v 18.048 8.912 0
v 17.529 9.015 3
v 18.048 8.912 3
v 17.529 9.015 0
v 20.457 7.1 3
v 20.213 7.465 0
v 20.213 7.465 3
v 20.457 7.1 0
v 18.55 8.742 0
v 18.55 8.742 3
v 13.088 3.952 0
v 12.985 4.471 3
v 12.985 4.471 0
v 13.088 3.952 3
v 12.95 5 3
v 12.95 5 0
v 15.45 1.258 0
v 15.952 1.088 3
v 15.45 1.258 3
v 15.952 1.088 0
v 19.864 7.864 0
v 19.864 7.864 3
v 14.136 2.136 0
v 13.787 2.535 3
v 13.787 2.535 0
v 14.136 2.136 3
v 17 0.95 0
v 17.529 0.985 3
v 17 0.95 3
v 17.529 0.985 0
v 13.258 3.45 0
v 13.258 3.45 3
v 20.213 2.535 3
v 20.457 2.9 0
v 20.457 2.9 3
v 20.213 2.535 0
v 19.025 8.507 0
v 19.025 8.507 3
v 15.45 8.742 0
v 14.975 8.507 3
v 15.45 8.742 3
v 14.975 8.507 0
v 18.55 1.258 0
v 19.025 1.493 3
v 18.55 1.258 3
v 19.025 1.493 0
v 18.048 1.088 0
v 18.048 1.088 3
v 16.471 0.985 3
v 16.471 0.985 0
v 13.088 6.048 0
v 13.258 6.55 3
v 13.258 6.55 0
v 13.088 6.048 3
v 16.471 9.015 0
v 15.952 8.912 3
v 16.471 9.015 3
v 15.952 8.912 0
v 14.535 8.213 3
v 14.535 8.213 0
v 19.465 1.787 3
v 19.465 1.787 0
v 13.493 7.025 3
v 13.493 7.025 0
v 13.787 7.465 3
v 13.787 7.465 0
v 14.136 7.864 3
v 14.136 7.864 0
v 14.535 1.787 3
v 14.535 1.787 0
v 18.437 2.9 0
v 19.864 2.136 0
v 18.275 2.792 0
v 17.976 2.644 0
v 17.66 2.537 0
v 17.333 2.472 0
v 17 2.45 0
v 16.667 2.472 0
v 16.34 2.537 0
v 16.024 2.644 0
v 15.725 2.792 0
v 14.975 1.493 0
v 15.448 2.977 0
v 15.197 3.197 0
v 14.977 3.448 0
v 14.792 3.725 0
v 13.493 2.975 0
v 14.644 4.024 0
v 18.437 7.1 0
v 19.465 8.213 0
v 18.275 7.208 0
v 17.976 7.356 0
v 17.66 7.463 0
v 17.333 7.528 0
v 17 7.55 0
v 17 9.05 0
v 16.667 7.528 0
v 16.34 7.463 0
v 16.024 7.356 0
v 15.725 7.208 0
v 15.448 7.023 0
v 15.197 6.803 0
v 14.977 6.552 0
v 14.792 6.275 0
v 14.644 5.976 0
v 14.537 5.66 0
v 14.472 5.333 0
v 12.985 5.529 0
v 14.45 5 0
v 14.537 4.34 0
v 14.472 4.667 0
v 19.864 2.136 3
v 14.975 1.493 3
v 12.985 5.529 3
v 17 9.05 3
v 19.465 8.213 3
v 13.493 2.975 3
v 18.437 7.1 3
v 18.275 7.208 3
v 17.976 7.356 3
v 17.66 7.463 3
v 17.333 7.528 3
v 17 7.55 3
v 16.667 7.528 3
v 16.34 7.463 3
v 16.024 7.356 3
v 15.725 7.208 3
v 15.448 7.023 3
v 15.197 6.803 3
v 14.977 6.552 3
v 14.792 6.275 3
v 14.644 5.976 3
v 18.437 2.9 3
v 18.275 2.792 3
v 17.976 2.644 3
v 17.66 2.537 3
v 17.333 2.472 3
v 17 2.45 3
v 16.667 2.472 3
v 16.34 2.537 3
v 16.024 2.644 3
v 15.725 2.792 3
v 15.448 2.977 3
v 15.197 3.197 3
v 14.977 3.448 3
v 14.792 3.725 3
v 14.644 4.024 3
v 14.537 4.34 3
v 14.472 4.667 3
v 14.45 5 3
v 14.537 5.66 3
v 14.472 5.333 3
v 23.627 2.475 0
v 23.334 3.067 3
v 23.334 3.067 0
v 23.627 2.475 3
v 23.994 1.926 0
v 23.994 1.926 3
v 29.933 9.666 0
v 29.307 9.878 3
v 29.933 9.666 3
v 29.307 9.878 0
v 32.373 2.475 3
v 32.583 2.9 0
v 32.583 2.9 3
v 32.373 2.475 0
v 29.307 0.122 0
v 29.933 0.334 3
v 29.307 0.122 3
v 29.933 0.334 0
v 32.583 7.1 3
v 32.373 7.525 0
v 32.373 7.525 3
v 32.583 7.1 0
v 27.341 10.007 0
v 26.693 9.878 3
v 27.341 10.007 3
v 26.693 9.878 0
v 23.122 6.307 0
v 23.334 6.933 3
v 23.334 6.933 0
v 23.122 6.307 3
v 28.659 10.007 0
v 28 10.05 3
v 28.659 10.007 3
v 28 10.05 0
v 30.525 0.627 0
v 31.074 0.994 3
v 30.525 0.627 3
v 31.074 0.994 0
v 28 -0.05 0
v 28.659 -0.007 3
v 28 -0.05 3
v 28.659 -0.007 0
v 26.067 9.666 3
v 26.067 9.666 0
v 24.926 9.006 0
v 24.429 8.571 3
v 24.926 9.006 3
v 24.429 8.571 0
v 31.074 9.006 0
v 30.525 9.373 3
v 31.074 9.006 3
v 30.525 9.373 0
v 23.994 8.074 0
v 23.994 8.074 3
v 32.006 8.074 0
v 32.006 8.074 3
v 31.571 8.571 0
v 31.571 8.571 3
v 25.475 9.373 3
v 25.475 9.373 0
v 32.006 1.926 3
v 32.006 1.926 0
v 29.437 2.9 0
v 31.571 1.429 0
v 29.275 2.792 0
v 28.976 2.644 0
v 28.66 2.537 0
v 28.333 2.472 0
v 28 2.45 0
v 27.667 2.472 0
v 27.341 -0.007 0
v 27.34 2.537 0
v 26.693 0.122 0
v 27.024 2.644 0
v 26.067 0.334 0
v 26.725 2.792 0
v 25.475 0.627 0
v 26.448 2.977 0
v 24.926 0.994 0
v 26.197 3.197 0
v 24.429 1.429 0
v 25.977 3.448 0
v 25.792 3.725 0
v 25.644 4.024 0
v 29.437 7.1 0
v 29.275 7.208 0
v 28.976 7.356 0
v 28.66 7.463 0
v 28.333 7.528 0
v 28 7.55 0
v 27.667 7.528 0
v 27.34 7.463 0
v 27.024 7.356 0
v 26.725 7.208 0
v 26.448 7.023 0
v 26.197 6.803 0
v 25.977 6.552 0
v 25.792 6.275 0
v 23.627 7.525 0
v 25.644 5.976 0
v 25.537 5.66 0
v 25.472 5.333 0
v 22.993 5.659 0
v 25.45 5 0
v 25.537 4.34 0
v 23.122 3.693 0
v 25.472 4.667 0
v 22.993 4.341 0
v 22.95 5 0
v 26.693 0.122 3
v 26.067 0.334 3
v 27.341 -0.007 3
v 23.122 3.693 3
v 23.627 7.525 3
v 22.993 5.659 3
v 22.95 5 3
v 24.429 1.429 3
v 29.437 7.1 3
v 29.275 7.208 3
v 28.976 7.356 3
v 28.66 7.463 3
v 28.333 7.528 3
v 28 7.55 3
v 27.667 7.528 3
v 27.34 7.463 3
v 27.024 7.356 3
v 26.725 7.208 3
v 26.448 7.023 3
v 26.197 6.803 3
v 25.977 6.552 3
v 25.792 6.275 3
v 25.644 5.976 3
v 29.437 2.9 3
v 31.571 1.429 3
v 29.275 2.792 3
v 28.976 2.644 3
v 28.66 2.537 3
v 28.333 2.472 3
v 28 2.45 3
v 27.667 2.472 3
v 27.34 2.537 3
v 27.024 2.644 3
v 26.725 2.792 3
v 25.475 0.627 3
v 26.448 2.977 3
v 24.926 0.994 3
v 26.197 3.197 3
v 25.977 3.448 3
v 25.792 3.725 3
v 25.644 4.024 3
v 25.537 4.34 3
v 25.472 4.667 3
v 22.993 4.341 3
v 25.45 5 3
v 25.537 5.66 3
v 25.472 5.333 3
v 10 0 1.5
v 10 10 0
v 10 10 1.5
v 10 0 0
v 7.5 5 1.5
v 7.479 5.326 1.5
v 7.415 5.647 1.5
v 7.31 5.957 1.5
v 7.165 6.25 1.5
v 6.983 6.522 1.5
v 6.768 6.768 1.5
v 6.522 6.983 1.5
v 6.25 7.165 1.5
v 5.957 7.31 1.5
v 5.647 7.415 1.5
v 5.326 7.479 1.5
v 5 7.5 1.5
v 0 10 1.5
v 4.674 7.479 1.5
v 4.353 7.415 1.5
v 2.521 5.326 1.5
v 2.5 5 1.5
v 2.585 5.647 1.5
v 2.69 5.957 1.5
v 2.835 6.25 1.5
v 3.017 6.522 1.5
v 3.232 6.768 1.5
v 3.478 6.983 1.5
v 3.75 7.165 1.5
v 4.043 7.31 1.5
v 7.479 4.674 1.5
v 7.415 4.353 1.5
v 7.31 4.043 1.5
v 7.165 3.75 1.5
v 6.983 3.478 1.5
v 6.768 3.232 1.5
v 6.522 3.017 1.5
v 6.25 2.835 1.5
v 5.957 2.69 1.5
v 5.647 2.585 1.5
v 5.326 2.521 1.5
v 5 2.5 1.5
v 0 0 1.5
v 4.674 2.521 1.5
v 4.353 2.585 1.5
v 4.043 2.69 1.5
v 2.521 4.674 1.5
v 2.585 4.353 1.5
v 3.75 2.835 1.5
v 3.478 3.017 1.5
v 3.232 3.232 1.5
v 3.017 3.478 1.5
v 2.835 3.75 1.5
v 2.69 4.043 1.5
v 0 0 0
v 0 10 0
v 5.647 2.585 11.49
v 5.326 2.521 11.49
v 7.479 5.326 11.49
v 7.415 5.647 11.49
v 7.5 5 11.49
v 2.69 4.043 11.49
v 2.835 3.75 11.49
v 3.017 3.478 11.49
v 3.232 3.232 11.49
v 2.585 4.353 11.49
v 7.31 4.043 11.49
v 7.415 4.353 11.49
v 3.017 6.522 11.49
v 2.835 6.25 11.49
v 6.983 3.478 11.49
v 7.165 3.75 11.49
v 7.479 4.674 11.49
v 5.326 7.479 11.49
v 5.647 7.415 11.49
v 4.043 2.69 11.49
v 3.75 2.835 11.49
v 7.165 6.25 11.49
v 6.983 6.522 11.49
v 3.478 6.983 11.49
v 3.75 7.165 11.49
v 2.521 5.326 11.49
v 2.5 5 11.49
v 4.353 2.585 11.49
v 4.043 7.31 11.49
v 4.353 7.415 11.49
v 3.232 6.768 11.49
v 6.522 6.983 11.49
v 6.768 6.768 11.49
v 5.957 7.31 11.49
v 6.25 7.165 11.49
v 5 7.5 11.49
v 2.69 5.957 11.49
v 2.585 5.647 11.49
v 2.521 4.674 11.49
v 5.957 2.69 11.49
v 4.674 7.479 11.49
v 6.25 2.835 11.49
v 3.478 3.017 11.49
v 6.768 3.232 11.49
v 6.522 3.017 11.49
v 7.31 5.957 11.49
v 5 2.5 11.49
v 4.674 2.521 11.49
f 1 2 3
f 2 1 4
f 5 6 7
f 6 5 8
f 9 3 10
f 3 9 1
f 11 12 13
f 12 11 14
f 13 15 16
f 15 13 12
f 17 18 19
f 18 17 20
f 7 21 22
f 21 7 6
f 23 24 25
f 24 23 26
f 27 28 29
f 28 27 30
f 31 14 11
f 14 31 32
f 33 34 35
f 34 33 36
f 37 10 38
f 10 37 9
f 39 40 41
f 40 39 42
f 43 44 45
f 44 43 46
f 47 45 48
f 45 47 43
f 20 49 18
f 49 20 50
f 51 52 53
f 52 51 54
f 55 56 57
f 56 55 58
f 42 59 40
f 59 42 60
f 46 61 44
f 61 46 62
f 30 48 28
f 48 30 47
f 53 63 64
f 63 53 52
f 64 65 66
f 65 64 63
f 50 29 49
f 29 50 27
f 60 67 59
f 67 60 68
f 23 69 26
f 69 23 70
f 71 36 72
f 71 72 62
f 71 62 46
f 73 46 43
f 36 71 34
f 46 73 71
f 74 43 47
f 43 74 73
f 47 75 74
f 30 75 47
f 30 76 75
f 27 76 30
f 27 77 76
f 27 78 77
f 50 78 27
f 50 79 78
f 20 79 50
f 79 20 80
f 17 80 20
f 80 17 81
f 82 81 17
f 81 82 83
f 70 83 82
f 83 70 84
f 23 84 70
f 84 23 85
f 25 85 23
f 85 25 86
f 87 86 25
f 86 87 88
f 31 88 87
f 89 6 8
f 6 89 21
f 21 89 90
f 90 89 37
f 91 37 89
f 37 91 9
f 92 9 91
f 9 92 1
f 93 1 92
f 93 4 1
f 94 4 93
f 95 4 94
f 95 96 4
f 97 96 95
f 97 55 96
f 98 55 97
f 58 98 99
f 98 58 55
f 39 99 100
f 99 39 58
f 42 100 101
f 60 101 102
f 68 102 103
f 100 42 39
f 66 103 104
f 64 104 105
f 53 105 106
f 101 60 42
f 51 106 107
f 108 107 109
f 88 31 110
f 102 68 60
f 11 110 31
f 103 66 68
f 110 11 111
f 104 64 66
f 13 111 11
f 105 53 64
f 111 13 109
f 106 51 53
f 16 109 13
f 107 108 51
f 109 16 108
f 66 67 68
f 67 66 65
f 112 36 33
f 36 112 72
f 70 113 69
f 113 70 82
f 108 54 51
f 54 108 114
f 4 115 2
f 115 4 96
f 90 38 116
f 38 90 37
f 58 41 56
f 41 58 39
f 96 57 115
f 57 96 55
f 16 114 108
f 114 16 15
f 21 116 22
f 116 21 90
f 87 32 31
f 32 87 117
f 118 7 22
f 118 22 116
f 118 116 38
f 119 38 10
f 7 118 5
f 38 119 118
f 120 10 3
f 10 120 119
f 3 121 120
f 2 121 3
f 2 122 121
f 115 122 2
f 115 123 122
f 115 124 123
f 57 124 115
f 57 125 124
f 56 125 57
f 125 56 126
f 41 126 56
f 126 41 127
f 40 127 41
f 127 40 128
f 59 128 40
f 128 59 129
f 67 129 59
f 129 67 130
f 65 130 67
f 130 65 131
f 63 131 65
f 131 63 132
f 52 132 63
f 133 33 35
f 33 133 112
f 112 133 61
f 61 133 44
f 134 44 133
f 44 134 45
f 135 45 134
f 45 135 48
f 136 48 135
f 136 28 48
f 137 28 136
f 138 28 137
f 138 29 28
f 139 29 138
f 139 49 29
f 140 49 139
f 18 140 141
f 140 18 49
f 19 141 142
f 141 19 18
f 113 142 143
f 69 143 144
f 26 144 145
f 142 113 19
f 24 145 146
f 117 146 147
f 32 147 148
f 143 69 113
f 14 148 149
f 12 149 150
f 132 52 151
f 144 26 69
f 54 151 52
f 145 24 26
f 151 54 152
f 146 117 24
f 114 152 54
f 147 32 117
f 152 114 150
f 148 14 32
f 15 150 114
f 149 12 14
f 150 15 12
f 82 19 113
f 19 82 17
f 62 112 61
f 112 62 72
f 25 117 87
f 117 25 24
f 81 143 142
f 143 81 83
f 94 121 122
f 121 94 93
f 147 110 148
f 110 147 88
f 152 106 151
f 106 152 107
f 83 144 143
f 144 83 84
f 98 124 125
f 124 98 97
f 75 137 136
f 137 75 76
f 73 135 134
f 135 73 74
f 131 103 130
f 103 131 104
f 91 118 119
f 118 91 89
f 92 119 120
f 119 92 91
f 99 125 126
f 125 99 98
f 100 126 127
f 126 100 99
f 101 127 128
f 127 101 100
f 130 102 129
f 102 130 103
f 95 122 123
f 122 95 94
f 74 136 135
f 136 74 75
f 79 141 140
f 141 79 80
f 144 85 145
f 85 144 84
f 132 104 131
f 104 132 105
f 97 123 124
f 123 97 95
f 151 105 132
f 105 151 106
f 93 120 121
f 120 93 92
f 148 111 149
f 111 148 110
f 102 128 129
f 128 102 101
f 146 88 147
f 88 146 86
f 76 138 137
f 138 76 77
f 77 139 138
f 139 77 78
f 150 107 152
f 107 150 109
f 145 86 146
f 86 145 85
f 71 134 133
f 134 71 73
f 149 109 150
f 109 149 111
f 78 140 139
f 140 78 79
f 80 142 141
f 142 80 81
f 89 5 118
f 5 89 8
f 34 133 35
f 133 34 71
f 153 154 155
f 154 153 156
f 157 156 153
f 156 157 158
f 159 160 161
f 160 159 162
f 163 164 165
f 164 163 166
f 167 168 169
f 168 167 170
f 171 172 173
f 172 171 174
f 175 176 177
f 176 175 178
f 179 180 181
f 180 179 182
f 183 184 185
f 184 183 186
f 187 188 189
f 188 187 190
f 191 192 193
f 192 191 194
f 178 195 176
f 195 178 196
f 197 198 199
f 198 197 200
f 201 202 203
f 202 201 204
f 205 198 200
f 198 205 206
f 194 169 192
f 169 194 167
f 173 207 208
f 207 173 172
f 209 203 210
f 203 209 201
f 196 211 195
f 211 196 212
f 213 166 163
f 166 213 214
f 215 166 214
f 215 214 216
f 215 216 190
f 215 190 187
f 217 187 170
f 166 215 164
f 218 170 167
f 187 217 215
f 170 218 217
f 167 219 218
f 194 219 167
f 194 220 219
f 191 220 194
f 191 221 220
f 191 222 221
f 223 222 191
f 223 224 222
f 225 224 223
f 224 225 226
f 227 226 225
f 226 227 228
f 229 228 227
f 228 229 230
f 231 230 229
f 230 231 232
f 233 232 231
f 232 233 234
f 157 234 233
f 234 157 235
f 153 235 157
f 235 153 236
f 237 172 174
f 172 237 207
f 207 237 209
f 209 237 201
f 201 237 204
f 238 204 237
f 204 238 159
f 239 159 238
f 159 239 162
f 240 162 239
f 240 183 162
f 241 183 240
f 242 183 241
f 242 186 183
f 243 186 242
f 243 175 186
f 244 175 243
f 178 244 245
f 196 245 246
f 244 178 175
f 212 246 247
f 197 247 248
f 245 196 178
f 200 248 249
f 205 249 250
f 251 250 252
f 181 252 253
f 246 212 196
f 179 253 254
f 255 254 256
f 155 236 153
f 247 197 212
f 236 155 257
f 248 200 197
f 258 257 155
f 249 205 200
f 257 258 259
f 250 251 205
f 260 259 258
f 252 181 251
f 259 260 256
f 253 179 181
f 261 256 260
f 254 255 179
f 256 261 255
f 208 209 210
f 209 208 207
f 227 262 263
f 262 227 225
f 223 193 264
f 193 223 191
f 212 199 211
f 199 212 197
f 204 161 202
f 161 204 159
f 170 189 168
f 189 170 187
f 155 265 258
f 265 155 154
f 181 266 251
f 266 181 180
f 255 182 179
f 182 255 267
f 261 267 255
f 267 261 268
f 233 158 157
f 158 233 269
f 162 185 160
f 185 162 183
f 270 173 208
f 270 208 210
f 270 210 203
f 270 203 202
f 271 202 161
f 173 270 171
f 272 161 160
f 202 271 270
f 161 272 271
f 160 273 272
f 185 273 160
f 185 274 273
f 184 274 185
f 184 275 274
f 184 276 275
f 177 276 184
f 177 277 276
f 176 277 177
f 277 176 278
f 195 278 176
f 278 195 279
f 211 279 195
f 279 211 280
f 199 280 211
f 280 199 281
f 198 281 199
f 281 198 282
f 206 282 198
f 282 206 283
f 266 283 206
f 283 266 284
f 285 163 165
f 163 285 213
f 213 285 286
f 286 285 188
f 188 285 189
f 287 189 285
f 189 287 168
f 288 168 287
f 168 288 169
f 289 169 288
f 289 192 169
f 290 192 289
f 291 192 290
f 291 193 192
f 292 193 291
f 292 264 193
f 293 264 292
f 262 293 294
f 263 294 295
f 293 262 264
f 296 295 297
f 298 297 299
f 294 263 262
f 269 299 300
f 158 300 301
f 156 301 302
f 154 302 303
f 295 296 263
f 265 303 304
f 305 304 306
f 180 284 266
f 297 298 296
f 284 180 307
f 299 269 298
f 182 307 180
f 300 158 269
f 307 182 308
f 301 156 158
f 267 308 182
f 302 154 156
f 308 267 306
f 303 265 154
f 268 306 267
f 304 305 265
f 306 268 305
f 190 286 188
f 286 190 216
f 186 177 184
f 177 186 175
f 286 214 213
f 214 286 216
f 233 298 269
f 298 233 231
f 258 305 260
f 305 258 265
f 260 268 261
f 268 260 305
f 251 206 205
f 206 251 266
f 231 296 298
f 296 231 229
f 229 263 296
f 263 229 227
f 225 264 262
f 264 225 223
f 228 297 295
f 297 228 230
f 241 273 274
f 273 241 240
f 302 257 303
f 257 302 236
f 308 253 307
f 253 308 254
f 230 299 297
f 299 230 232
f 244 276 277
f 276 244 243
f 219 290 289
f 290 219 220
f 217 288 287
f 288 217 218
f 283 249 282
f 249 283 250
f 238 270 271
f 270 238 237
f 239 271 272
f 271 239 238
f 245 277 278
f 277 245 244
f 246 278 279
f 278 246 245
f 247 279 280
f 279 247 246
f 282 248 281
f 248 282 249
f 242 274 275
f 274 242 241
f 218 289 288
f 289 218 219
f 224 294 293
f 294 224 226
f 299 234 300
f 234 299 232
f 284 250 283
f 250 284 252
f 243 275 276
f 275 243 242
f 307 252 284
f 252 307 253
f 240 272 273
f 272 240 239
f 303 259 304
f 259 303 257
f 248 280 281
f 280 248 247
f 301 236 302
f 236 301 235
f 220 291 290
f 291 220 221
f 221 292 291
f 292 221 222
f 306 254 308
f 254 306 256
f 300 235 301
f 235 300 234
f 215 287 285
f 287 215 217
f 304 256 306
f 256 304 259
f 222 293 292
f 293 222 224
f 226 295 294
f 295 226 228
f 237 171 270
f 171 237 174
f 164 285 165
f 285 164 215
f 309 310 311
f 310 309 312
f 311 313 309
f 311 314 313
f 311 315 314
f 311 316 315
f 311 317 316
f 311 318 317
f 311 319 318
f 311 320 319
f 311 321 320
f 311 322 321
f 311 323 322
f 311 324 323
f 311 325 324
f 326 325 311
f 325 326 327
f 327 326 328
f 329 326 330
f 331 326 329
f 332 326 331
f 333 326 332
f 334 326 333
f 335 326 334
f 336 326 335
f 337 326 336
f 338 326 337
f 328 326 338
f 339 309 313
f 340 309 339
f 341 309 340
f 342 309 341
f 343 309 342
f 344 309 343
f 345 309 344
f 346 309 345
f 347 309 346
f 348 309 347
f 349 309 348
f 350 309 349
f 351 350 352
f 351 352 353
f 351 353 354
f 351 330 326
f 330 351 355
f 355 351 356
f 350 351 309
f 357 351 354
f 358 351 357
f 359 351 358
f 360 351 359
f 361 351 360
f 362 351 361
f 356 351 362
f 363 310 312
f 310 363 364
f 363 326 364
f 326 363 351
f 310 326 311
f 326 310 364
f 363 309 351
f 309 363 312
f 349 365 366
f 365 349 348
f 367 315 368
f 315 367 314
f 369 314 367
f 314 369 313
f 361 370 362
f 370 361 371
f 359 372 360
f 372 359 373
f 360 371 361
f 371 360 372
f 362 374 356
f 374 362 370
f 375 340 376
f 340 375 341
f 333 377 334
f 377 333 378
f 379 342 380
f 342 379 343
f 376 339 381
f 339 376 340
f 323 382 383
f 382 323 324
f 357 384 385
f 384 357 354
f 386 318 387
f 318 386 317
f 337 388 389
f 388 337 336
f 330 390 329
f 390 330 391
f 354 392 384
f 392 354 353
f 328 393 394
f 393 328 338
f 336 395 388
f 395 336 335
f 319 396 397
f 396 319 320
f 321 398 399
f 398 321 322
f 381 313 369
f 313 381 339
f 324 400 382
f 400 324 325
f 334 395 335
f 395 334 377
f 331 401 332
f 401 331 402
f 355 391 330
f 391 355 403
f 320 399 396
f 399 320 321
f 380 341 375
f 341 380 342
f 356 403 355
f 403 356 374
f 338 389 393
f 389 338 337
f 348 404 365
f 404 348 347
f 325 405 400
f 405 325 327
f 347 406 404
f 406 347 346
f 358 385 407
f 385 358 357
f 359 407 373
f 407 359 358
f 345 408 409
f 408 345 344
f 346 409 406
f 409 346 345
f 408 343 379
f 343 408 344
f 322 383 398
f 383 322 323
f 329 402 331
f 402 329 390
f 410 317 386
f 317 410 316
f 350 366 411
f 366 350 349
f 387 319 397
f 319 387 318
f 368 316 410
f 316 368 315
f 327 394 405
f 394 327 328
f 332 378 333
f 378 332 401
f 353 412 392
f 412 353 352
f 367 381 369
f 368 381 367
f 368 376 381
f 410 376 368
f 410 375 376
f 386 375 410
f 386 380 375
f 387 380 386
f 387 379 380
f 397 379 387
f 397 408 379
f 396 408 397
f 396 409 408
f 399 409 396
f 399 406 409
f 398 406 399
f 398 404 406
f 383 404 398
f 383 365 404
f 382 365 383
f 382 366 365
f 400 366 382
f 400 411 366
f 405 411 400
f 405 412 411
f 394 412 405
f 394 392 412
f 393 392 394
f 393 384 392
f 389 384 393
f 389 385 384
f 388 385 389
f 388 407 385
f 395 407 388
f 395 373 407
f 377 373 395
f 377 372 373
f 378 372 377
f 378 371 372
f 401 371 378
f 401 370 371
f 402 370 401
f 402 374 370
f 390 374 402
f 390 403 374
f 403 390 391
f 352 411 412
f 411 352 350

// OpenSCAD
// TinyMaker Resin Lab - spaustukas ant strypo (paprastas modelis).
// Ar derva daro tai, kam skirta: apkabą užmauti ant strypo ir nuimti 10 kartų.
//   Strypas Ø5 mm, 10 mm aukščio, ant 10 × 10 mm pado.
//   Dvi apkabos: sienelė 1,5 ir 2,5 mm, anga 4,2 mm (siauresnė už strypą - turi
//   išsilenkti). Trapi derva plona apkaba skils; kieta - laikys, bet sunkiai užsimaus.
// STL: openscad -o TM_spaustukas.stl tm_spaustukas.scad

$fn = 48;
ROD = 5; GAP = 4.2; H = 3;

module clip(wall) {
  difference() {
    cylinder(d = ROD + 0.1 + 2 * wall, h = H);
    translate([0, 0, -1]) cylinder(d = ROD + 0.1, h = H + 2);
    translate([0, -GAP / 2, -1]) cube([ROD + 2 * wall, GAP, H + 2]);
  }
}

cube([10, 10, 1.5]);
translate([5, 5, 1.49]) cylinder(d = ROD, h = 10);
translate([17, 5, 0]) clip(1.5);
translate([28, 5, 0]) clip(2.5);
